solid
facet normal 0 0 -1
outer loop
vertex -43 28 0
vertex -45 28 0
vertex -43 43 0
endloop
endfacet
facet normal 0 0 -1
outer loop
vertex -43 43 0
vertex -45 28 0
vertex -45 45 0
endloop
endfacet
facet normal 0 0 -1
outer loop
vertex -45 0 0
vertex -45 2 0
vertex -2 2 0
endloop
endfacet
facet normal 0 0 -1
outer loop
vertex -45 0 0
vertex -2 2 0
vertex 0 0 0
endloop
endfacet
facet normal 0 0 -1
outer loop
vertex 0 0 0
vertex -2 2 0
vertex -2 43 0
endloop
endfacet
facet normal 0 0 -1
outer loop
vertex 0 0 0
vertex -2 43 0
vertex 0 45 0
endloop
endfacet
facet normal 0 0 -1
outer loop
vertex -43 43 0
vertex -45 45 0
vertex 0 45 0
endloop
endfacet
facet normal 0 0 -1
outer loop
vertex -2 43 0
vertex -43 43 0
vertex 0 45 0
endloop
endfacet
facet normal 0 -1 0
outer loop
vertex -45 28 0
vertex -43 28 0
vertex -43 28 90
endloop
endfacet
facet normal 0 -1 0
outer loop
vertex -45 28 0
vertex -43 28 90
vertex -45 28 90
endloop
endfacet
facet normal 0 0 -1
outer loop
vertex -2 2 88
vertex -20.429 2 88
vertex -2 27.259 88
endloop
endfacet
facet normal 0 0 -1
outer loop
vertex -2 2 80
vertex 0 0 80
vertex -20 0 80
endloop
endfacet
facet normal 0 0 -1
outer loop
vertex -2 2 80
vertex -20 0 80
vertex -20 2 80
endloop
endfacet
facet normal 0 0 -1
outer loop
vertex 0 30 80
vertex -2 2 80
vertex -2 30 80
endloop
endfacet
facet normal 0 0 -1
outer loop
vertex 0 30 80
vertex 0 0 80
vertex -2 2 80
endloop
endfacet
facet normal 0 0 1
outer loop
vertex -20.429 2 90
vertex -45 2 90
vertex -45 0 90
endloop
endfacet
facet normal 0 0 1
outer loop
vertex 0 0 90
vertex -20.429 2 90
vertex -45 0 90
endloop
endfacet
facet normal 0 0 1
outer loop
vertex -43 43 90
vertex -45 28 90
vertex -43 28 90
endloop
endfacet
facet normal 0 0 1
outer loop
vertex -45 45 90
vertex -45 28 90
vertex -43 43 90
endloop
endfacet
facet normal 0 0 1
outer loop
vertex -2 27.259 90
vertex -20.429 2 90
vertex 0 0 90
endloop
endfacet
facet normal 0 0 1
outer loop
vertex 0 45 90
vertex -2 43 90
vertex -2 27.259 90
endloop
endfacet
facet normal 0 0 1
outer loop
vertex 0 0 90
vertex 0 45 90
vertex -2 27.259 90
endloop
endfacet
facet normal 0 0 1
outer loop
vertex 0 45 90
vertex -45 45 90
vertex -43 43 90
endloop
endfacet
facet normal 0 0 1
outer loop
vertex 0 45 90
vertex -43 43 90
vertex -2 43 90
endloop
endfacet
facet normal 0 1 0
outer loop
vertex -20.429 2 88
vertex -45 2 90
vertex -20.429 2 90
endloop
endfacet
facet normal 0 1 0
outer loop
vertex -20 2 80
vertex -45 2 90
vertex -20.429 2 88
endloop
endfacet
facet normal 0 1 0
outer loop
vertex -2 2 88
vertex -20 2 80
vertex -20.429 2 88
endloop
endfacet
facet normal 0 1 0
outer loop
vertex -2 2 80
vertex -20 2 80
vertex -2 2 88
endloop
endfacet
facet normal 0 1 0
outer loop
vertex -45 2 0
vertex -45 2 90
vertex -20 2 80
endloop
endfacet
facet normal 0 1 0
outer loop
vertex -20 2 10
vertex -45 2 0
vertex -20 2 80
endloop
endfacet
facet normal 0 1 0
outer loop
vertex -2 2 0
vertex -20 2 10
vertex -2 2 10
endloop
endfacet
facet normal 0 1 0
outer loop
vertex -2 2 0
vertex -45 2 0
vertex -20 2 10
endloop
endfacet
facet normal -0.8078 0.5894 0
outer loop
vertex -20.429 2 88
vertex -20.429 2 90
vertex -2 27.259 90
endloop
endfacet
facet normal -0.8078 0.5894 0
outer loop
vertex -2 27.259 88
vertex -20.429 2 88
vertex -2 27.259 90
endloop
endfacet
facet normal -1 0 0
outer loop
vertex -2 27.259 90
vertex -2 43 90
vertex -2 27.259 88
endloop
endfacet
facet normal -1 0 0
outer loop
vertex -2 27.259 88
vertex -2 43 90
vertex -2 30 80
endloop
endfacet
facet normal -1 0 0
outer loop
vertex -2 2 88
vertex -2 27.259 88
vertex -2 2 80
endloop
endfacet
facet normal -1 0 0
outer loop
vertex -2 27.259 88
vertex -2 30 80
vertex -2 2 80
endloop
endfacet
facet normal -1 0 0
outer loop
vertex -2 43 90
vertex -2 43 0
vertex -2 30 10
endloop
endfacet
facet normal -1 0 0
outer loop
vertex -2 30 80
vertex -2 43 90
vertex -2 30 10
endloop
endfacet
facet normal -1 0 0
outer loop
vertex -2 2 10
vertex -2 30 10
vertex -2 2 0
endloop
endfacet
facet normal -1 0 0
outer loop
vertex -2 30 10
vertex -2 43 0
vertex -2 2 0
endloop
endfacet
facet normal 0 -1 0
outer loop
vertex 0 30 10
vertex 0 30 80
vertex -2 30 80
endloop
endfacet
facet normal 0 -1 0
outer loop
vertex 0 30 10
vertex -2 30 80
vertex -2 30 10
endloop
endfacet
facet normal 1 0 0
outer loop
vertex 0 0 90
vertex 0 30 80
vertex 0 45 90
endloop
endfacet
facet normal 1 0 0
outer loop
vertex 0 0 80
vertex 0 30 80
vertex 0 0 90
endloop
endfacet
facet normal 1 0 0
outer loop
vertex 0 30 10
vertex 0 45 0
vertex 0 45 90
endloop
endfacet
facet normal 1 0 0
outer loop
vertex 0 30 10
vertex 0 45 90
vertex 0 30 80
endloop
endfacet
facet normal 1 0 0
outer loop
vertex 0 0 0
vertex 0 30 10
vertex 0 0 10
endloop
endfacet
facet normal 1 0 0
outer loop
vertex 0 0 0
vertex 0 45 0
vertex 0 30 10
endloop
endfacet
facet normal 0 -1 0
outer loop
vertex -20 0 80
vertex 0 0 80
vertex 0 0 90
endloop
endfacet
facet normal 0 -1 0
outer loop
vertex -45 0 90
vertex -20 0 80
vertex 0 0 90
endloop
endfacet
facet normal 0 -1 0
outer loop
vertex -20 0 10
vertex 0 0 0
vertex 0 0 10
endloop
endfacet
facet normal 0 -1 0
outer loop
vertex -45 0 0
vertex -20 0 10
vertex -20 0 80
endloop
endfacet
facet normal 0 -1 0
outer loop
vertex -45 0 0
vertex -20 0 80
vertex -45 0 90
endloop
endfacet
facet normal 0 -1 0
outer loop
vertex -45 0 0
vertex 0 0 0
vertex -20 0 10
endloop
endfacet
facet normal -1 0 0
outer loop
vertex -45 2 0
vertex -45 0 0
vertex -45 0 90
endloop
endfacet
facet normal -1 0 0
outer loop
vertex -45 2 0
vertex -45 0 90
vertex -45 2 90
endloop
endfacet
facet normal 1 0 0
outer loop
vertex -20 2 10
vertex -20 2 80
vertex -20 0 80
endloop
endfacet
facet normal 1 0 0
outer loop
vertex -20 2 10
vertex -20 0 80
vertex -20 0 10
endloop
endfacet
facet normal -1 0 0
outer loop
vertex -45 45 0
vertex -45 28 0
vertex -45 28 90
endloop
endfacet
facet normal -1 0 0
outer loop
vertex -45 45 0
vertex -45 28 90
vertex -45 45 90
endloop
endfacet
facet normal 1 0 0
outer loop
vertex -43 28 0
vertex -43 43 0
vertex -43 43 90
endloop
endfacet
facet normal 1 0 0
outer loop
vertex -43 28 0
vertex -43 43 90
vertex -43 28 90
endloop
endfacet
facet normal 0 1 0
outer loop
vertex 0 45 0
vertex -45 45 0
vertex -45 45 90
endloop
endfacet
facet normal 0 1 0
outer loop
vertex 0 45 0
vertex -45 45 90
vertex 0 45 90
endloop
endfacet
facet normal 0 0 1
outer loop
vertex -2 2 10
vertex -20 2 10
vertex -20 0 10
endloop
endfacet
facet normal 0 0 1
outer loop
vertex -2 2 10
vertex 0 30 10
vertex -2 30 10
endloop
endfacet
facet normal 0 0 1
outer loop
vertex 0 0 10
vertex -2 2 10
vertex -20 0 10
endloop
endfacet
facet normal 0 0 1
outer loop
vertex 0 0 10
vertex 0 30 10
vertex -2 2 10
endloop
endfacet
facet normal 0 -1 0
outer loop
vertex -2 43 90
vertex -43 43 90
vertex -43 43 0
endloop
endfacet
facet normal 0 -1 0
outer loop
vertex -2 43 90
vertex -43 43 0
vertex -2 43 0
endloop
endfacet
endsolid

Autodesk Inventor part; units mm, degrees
ref_plane "YZ Plane" through (0, 0, 0) normal (1, 0, 0) x (0, 1, 0)
ref_plane "XZ Plane" through (0, 0, 0) normal (0, 1, 0) x (-1, 0, 0)
sketch "Sketch1" plane through (0, 0, 0) normal (0, 0, 1) x (1, 0, 0)
  line L0 (0, 0) -> (-45, 0)
  line L1 (-45, 0) -> (-45, 45)
  line L2 (-45, 45) -> (0, 45)
  line L3 (0, 45) -> (0, 0)
  line L4 (-2, 45) -> (-2, 0)
  line L5 (-45, 2) -> (-2, 2)
  line L6 (-2, 45) -> (-45, 45)
  line L7 (-45, 45) -> (-45, 43)
  line L8 (-45, 43) -> (-2, 43)
  line L9 (-2, 43) -> (-2, 45)
  line L10 (-45, 43) -> (-43, 43)
  line L11 (-43, 43) -> (-43, 28)
  line L12 (-43, 28) -> (-45, 28)
  line L13 (-45, 28) -> (-45, 43)
  dimension "d0" = 45
  dimension "d1" = 45
  dimension "d2" = 2
  dimension "d3" = 2
  dimension "d17" = 2
  dimension "d18" = 2
  dimension "d19" = 15
extrude "Extrusion1" add sketch "Sketch1" along normal blind 90 contours L0 L4 L2 L3 | L0 L1 L5 L4
sketch "Sketch2" plane through (0, 0, 90) normal (0, 0, 1) x (1, 0, 0)
  line L0 (-45, 0) -> (0, 0) projected
  line L1 (0, 0) -> (-30, 0)
  line L2 (-30, 0) -> (-30, 30)
  line L3 (-30, 30) -> (0, 30)
  line L4 (0, 30) -> (0, 0)
  line L5 (0, 0) -> (-21.8882, 0)
  line L6 (-21.8882, 0) -> (0, 30)
  dimension "d6" = 30
  dimension "d7" = 30
  dimension "d8" = 30
extrude "Extrusion2" add sketch "Sketch2" against normal blind 2 contours L6 L4 L0
ref_plane "Work Plane1" through (0, 0, 45) normal (0, 0, -1) x (-1, 0, 0)
sketch "Sketch3" plane through (0, 0, 0) normal (1, 0, 0) x (0, 0, -1)
  line L0 (-80, 30) -> (-10, 30)
  line L1 (-10, 30) -> (-10, -10)
  line L2 (-10, -10) -> (-80, -10)
  line L3 (-80, -10) -> (-80, 30)
  line L4 (0, 45) -> (-90, 45) projected
  line L5 (0, 0) -> (0, 45) projected
  dimension "d11" = 70
  dimension "d12" = 40
  dimension "d13" = 15
  dimension "d14" = 10
extrude "Extrusion3" cut sketch "Sketch3" against normal blind 20
extrude "Extrusion4" add sketch "Sketch1" along normal blind 90 contours L4 L8 L1 L2 | L1 L8 L11 L12
properties part number "belt_holder"
